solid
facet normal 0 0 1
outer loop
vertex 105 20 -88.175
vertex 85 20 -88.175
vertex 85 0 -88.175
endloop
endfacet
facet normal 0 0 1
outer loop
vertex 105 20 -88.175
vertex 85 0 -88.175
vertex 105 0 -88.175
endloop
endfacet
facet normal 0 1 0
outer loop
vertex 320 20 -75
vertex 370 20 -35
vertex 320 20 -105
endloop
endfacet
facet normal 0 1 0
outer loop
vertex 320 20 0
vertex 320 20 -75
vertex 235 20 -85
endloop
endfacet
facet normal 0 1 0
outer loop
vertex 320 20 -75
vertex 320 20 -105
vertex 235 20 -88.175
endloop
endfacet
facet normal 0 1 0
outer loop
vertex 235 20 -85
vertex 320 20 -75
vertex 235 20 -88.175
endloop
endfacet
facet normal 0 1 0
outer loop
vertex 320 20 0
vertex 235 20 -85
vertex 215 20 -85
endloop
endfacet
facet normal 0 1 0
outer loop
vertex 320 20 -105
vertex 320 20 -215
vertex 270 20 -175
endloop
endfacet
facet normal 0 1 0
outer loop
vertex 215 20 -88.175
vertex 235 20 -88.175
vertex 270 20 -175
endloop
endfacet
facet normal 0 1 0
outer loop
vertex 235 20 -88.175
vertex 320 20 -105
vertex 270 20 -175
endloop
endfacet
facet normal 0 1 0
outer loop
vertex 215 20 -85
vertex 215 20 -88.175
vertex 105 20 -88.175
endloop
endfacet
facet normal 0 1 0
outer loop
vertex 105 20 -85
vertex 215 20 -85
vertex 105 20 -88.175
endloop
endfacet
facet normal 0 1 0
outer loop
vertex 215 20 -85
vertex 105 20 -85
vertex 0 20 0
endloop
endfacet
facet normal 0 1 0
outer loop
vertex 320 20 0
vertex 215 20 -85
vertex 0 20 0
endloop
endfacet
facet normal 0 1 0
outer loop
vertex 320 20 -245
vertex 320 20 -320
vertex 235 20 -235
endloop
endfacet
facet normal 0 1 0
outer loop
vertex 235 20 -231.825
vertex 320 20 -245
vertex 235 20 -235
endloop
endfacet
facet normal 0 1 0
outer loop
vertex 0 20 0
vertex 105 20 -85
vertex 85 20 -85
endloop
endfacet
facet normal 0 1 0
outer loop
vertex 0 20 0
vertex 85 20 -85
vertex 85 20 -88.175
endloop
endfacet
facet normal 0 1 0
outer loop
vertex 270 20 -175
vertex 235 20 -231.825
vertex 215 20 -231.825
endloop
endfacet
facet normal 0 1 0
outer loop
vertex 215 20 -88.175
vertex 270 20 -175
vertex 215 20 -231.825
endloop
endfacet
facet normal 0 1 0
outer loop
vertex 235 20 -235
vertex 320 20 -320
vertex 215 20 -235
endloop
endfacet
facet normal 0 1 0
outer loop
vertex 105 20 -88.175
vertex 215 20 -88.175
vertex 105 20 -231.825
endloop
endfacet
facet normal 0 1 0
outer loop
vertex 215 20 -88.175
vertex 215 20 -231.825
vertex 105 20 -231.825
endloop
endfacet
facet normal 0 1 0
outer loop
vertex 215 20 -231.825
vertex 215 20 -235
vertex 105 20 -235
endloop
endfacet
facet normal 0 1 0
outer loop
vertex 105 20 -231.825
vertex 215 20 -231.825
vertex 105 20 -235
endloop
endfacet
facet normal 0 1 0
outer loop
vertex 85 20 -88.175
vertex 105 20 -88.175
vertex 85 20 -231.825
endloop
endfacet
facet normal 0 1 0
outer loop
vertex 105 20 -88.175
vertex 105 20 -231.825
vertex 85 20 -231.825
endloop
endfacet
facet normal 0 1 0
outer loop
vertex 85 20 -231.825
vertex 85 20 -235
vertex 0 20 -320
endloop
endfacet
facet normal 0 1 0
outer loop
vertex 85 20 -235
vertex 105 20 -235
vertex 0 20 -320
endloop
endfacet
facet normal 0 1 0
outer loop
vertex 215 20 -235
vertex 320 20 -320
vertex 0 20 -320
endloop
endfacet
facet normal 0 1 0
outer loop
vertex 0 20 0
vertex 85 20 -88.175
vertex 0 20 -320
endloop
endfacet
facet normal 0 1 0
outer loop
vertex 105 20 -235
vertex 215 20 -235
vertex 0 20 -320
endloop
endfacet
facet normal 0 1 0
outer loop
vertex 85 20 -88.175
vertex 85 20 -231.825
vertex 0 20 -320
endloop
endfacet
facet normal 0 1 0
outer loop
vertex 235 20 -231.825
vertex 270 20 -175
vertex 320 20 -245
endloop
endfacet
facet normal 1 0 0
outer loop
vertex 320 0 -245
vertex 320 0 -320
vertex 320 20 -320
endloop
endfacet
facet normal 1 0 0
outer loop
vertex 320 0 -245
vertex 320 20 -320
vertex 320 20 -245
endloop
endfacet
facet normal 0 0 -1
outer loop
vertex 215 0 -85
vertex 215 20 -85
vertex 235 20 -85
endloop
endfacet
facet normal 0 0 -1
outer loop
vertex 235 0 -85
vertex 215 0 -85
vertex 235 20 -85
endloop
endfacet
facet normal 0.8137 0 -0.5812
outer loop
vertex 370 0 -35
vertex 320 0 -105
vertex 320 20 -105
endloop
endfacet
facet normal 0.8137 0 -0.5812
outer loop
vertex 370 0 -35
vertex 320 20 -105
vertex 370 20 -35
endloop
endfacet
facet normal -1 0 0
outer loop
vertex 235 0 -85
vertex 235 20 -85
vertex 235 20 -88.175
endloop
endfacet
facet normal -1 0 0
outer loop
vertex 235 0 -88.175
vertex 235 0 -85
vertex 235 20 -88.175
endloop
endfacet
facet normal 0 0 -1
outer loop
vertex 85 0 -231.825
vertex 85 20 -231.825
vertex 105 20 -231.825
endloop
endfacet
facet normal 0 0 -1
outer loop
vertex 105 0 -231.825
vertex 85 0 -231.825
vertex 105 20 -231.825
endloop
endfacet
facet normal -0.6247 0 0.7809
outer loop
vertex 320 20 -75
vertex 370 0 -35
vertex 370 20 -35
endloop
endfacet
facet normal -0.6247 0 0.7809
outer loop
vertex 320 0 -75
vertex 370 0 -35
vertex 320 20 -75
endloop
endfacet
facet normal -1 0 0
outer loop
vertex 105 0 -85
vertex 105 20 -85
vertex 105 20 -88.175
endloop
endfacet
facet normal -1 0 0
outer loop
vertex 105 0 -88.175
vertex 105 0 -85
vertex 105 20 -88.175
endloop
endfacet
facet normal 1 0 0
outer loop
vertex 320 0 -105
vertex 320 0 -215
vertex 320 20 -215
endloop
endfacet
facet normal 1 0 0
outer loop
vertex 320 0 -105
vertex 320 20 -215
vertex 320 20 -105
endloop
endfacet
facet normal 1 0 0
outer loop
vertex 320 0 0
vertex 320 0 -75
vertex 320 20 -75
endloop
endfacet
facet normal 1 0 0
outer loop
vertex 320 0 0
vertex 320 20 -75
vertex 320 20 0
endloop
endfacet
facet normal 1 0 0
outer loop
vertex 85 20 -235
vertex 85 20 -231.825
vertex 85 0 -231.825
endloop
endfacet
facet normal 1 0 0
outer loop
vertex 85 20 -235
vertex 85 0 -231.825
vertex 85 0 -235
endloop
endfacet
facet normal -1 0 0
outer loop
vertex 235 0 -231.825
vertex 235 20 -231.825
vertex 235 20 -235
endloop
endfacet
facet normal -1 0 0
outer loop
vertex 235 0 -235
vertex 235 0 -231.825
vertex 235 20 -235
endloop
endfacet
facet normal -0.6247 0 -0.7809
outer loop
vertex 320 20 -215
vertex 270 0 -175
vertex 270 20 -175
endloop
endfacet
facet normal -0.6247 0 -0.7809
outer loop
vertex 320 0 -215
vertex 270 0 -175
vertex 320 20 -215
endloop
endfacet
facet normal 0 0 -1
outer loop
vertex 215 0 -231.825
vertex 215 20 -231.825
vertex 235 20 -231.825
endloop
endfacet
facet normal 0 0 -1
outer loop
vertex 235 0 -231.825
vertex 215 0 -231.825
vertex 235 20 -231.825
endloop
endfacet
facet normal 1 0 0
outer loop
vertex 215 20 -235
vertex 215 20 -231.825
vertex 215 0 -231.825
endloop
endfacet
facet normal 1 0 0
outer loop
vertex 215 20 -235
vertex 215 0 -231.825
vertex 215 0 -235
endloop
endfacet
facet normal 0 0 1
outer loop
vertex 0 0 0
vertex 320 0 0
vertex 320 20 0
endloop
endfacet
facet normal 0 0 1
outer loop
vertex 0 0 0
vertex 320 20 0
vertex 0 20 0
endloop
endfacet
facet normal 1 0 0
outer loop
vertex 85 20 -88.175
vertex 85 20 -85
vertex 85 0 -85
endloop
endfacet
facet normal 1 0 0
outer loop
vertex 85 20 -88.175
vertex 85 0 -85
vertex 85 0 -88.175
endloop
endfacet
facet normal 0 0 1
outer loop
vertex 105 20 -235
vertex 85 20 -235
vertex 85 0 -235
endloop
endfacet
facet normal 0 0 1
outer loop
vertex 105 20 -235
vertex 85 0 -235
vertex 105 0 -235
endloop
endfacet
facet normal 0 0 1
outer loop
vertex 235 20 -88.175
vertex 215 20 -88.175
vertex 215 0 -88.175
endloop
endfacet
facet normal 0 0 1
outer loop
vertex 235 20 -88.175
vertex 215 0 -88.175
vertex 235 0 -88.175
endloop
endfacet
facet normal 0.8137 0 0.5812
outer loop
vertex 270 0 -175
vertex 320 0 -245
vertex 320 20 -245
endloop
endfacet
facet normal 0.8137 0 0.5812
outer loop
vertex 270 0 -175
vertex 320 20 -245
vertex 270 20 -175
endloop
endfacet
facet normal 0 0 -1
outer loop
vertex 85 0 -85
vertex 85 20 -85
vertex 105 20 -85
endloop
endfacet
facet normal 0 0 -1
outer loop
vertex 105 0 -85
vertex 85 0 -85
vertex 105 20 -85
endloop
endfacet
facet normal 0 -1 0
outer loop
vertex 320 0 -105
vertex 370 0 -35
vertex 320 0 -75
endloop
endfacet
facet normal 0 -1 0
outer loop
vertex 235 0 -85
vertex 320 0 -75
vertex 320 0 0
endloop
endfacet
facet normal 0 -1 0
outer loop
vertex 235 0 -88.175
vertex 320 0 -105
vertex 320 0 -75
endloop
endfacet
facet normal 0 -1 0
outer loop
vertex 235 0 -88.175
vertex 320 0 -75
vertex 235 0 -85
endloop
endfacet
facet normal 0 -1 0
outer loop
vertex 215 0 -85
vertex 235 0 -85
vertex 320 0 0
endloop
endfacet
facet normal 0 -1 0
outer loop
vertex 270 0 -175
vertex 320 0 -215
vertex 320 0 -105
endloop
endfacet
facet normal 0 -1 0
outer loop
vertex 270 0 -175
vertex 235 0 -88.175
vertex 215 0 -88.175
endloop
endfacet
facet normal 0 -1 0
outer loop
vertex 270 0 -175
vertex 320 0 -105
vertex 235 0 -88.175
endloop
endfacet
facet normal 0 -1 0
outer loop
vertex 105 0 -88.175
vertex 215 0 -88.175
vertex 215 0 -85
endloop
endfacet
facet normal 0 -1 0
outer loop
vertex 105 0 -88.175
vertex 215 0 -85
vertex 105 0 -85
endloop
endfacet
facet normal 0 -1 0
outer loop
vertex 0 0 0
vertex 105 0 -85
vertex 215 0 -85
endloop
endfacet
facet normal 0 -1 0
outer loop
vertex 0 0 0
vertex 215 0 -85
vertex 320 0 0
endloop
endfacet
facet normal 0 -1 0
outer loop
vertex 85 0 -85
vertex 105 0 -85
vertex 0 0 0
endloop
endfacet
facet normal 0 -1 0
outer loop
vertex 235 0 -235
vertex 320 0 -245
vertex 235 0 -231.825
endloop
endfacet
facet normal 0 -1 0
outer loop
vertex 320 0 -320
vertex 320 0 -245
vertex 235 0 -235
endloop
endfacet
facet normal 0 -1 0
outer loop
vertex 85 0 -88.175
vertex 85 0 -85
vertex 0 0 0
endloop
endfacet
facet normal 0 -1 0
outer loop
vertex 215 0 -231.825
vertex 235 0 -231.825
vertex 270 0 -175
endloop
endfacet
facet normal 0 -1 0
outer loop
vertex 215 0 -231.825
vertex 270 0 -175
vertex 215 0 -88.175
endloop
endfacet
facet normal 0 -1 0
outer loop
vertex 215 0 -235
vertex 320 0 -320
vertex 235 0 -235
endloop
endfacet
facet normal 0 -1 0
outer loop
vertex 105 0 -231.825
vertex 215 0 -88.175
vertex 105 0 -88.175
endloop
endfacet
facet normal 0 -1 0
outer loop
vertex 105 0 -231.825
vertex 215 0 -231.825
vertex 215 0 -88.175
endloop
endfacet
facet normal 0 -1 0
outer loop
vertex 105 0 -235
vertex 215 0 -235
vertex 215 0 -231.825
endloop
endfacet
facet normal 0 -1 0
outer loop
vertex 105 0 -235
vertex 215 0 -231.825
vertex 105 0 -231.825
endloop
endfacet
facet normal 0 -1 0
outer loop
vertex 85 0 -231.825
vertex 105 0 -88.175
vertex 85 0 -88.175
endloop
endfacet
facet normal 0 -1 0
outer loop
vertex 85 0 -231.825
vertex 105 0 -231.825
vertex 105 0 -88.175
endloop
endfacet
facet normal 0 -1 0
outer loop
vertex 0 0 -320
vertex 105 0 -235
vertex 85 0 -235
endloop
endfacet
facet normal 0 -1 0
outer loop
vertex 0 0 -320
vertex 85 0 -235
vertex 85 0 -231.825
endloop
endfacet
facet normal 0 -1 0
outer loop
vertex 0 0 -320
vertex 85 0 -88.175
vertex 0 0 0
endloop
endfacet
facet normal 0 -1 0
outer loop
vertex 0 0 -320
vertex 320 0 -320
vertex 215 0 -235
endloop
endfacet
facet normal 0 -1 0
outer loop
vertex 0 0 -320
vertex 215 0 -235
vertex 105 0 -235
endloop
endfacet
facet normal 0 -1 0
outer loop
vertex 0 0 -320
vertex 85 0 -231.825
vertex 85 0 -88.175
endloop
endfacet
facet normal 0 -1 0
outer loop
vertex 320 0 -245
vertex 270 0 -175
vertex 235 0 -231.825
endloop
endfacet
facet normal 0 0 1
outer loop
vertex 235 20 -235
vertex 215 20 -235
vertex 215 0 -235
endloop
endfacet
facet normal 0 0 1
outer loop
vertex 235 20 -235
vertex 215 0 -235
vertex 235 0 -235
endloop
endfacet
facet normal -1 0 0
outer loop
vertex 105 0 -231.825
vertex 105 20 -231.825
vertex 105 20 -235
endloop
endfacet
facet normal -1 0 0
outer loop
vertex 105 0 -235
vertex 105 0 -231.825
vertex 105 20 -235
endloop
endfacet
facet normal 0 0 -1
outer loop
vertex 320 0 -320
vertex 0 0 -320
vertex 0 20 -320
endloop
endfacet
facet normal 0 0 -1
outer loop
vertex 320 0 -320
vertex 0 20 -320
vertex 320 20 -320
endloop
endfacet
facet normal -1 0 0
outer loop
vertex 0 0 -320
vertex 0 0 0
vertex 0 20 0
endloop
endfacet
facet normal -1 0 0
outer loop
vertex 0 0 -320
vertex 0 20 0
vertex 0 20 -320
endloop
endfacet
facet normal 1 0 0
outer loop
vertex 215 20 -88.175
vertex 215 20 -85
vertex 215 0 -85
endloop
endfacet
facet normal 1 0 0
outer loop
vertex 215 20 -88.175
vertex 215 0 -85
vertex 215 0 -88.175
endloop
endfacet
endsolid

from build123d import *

# Parameters (mm, degrees)
BOSS_EXTRUDE1_DEPTH = 20
SKETCH2_W           = 20
SKETCH2_H           = 3.175
CUT_EXTRUDE2_DEPTH  = 490.591666596


with BuildPart() as part:
    # Sketch1 → Boss-Extrude1 (new body)
    with BuildSketch(Plane(origin=(0, 0, 0), x_dir=(1, 0, 0), z_dir=(0, 1, 0))):
        Polygon((320, 245), (270, 175), (320, 215), (320, 105), (370, 35), (320, 75), (320, 0), (0, 0), (0, 320), (320, 320), align=None)
    extrude(amount=BOSS_EXTRUDE1_DEPTH)

    # Sketch2 → Cut-Extrude2 (cut, through all)
    with BuildSketch(Plane(origin=(0, 20, 0), x_dir=(1, 0, 0), z_dir=(0, 1, 0))):
        with Locations((225, 233.4125)):
            Rectangle(SKETCH2_W, SKETCH2_H)
        with Locations((95, 233.4125)):
            Rectangle(SKETCH2_W, SKETCH2_H)
        with Locations((95, 86.5875)):
            Rectangle(SKETCH2_W, SKETCH2_H)
        with Locations((225, 86.5875)):
            Rectangle(SKETCH2_W, SKETCH2_H)
    extrude(amount=-CUT_EXTRUDE2_DEPTH, mode=Mode.SUBTRACT)


solid = part.part
